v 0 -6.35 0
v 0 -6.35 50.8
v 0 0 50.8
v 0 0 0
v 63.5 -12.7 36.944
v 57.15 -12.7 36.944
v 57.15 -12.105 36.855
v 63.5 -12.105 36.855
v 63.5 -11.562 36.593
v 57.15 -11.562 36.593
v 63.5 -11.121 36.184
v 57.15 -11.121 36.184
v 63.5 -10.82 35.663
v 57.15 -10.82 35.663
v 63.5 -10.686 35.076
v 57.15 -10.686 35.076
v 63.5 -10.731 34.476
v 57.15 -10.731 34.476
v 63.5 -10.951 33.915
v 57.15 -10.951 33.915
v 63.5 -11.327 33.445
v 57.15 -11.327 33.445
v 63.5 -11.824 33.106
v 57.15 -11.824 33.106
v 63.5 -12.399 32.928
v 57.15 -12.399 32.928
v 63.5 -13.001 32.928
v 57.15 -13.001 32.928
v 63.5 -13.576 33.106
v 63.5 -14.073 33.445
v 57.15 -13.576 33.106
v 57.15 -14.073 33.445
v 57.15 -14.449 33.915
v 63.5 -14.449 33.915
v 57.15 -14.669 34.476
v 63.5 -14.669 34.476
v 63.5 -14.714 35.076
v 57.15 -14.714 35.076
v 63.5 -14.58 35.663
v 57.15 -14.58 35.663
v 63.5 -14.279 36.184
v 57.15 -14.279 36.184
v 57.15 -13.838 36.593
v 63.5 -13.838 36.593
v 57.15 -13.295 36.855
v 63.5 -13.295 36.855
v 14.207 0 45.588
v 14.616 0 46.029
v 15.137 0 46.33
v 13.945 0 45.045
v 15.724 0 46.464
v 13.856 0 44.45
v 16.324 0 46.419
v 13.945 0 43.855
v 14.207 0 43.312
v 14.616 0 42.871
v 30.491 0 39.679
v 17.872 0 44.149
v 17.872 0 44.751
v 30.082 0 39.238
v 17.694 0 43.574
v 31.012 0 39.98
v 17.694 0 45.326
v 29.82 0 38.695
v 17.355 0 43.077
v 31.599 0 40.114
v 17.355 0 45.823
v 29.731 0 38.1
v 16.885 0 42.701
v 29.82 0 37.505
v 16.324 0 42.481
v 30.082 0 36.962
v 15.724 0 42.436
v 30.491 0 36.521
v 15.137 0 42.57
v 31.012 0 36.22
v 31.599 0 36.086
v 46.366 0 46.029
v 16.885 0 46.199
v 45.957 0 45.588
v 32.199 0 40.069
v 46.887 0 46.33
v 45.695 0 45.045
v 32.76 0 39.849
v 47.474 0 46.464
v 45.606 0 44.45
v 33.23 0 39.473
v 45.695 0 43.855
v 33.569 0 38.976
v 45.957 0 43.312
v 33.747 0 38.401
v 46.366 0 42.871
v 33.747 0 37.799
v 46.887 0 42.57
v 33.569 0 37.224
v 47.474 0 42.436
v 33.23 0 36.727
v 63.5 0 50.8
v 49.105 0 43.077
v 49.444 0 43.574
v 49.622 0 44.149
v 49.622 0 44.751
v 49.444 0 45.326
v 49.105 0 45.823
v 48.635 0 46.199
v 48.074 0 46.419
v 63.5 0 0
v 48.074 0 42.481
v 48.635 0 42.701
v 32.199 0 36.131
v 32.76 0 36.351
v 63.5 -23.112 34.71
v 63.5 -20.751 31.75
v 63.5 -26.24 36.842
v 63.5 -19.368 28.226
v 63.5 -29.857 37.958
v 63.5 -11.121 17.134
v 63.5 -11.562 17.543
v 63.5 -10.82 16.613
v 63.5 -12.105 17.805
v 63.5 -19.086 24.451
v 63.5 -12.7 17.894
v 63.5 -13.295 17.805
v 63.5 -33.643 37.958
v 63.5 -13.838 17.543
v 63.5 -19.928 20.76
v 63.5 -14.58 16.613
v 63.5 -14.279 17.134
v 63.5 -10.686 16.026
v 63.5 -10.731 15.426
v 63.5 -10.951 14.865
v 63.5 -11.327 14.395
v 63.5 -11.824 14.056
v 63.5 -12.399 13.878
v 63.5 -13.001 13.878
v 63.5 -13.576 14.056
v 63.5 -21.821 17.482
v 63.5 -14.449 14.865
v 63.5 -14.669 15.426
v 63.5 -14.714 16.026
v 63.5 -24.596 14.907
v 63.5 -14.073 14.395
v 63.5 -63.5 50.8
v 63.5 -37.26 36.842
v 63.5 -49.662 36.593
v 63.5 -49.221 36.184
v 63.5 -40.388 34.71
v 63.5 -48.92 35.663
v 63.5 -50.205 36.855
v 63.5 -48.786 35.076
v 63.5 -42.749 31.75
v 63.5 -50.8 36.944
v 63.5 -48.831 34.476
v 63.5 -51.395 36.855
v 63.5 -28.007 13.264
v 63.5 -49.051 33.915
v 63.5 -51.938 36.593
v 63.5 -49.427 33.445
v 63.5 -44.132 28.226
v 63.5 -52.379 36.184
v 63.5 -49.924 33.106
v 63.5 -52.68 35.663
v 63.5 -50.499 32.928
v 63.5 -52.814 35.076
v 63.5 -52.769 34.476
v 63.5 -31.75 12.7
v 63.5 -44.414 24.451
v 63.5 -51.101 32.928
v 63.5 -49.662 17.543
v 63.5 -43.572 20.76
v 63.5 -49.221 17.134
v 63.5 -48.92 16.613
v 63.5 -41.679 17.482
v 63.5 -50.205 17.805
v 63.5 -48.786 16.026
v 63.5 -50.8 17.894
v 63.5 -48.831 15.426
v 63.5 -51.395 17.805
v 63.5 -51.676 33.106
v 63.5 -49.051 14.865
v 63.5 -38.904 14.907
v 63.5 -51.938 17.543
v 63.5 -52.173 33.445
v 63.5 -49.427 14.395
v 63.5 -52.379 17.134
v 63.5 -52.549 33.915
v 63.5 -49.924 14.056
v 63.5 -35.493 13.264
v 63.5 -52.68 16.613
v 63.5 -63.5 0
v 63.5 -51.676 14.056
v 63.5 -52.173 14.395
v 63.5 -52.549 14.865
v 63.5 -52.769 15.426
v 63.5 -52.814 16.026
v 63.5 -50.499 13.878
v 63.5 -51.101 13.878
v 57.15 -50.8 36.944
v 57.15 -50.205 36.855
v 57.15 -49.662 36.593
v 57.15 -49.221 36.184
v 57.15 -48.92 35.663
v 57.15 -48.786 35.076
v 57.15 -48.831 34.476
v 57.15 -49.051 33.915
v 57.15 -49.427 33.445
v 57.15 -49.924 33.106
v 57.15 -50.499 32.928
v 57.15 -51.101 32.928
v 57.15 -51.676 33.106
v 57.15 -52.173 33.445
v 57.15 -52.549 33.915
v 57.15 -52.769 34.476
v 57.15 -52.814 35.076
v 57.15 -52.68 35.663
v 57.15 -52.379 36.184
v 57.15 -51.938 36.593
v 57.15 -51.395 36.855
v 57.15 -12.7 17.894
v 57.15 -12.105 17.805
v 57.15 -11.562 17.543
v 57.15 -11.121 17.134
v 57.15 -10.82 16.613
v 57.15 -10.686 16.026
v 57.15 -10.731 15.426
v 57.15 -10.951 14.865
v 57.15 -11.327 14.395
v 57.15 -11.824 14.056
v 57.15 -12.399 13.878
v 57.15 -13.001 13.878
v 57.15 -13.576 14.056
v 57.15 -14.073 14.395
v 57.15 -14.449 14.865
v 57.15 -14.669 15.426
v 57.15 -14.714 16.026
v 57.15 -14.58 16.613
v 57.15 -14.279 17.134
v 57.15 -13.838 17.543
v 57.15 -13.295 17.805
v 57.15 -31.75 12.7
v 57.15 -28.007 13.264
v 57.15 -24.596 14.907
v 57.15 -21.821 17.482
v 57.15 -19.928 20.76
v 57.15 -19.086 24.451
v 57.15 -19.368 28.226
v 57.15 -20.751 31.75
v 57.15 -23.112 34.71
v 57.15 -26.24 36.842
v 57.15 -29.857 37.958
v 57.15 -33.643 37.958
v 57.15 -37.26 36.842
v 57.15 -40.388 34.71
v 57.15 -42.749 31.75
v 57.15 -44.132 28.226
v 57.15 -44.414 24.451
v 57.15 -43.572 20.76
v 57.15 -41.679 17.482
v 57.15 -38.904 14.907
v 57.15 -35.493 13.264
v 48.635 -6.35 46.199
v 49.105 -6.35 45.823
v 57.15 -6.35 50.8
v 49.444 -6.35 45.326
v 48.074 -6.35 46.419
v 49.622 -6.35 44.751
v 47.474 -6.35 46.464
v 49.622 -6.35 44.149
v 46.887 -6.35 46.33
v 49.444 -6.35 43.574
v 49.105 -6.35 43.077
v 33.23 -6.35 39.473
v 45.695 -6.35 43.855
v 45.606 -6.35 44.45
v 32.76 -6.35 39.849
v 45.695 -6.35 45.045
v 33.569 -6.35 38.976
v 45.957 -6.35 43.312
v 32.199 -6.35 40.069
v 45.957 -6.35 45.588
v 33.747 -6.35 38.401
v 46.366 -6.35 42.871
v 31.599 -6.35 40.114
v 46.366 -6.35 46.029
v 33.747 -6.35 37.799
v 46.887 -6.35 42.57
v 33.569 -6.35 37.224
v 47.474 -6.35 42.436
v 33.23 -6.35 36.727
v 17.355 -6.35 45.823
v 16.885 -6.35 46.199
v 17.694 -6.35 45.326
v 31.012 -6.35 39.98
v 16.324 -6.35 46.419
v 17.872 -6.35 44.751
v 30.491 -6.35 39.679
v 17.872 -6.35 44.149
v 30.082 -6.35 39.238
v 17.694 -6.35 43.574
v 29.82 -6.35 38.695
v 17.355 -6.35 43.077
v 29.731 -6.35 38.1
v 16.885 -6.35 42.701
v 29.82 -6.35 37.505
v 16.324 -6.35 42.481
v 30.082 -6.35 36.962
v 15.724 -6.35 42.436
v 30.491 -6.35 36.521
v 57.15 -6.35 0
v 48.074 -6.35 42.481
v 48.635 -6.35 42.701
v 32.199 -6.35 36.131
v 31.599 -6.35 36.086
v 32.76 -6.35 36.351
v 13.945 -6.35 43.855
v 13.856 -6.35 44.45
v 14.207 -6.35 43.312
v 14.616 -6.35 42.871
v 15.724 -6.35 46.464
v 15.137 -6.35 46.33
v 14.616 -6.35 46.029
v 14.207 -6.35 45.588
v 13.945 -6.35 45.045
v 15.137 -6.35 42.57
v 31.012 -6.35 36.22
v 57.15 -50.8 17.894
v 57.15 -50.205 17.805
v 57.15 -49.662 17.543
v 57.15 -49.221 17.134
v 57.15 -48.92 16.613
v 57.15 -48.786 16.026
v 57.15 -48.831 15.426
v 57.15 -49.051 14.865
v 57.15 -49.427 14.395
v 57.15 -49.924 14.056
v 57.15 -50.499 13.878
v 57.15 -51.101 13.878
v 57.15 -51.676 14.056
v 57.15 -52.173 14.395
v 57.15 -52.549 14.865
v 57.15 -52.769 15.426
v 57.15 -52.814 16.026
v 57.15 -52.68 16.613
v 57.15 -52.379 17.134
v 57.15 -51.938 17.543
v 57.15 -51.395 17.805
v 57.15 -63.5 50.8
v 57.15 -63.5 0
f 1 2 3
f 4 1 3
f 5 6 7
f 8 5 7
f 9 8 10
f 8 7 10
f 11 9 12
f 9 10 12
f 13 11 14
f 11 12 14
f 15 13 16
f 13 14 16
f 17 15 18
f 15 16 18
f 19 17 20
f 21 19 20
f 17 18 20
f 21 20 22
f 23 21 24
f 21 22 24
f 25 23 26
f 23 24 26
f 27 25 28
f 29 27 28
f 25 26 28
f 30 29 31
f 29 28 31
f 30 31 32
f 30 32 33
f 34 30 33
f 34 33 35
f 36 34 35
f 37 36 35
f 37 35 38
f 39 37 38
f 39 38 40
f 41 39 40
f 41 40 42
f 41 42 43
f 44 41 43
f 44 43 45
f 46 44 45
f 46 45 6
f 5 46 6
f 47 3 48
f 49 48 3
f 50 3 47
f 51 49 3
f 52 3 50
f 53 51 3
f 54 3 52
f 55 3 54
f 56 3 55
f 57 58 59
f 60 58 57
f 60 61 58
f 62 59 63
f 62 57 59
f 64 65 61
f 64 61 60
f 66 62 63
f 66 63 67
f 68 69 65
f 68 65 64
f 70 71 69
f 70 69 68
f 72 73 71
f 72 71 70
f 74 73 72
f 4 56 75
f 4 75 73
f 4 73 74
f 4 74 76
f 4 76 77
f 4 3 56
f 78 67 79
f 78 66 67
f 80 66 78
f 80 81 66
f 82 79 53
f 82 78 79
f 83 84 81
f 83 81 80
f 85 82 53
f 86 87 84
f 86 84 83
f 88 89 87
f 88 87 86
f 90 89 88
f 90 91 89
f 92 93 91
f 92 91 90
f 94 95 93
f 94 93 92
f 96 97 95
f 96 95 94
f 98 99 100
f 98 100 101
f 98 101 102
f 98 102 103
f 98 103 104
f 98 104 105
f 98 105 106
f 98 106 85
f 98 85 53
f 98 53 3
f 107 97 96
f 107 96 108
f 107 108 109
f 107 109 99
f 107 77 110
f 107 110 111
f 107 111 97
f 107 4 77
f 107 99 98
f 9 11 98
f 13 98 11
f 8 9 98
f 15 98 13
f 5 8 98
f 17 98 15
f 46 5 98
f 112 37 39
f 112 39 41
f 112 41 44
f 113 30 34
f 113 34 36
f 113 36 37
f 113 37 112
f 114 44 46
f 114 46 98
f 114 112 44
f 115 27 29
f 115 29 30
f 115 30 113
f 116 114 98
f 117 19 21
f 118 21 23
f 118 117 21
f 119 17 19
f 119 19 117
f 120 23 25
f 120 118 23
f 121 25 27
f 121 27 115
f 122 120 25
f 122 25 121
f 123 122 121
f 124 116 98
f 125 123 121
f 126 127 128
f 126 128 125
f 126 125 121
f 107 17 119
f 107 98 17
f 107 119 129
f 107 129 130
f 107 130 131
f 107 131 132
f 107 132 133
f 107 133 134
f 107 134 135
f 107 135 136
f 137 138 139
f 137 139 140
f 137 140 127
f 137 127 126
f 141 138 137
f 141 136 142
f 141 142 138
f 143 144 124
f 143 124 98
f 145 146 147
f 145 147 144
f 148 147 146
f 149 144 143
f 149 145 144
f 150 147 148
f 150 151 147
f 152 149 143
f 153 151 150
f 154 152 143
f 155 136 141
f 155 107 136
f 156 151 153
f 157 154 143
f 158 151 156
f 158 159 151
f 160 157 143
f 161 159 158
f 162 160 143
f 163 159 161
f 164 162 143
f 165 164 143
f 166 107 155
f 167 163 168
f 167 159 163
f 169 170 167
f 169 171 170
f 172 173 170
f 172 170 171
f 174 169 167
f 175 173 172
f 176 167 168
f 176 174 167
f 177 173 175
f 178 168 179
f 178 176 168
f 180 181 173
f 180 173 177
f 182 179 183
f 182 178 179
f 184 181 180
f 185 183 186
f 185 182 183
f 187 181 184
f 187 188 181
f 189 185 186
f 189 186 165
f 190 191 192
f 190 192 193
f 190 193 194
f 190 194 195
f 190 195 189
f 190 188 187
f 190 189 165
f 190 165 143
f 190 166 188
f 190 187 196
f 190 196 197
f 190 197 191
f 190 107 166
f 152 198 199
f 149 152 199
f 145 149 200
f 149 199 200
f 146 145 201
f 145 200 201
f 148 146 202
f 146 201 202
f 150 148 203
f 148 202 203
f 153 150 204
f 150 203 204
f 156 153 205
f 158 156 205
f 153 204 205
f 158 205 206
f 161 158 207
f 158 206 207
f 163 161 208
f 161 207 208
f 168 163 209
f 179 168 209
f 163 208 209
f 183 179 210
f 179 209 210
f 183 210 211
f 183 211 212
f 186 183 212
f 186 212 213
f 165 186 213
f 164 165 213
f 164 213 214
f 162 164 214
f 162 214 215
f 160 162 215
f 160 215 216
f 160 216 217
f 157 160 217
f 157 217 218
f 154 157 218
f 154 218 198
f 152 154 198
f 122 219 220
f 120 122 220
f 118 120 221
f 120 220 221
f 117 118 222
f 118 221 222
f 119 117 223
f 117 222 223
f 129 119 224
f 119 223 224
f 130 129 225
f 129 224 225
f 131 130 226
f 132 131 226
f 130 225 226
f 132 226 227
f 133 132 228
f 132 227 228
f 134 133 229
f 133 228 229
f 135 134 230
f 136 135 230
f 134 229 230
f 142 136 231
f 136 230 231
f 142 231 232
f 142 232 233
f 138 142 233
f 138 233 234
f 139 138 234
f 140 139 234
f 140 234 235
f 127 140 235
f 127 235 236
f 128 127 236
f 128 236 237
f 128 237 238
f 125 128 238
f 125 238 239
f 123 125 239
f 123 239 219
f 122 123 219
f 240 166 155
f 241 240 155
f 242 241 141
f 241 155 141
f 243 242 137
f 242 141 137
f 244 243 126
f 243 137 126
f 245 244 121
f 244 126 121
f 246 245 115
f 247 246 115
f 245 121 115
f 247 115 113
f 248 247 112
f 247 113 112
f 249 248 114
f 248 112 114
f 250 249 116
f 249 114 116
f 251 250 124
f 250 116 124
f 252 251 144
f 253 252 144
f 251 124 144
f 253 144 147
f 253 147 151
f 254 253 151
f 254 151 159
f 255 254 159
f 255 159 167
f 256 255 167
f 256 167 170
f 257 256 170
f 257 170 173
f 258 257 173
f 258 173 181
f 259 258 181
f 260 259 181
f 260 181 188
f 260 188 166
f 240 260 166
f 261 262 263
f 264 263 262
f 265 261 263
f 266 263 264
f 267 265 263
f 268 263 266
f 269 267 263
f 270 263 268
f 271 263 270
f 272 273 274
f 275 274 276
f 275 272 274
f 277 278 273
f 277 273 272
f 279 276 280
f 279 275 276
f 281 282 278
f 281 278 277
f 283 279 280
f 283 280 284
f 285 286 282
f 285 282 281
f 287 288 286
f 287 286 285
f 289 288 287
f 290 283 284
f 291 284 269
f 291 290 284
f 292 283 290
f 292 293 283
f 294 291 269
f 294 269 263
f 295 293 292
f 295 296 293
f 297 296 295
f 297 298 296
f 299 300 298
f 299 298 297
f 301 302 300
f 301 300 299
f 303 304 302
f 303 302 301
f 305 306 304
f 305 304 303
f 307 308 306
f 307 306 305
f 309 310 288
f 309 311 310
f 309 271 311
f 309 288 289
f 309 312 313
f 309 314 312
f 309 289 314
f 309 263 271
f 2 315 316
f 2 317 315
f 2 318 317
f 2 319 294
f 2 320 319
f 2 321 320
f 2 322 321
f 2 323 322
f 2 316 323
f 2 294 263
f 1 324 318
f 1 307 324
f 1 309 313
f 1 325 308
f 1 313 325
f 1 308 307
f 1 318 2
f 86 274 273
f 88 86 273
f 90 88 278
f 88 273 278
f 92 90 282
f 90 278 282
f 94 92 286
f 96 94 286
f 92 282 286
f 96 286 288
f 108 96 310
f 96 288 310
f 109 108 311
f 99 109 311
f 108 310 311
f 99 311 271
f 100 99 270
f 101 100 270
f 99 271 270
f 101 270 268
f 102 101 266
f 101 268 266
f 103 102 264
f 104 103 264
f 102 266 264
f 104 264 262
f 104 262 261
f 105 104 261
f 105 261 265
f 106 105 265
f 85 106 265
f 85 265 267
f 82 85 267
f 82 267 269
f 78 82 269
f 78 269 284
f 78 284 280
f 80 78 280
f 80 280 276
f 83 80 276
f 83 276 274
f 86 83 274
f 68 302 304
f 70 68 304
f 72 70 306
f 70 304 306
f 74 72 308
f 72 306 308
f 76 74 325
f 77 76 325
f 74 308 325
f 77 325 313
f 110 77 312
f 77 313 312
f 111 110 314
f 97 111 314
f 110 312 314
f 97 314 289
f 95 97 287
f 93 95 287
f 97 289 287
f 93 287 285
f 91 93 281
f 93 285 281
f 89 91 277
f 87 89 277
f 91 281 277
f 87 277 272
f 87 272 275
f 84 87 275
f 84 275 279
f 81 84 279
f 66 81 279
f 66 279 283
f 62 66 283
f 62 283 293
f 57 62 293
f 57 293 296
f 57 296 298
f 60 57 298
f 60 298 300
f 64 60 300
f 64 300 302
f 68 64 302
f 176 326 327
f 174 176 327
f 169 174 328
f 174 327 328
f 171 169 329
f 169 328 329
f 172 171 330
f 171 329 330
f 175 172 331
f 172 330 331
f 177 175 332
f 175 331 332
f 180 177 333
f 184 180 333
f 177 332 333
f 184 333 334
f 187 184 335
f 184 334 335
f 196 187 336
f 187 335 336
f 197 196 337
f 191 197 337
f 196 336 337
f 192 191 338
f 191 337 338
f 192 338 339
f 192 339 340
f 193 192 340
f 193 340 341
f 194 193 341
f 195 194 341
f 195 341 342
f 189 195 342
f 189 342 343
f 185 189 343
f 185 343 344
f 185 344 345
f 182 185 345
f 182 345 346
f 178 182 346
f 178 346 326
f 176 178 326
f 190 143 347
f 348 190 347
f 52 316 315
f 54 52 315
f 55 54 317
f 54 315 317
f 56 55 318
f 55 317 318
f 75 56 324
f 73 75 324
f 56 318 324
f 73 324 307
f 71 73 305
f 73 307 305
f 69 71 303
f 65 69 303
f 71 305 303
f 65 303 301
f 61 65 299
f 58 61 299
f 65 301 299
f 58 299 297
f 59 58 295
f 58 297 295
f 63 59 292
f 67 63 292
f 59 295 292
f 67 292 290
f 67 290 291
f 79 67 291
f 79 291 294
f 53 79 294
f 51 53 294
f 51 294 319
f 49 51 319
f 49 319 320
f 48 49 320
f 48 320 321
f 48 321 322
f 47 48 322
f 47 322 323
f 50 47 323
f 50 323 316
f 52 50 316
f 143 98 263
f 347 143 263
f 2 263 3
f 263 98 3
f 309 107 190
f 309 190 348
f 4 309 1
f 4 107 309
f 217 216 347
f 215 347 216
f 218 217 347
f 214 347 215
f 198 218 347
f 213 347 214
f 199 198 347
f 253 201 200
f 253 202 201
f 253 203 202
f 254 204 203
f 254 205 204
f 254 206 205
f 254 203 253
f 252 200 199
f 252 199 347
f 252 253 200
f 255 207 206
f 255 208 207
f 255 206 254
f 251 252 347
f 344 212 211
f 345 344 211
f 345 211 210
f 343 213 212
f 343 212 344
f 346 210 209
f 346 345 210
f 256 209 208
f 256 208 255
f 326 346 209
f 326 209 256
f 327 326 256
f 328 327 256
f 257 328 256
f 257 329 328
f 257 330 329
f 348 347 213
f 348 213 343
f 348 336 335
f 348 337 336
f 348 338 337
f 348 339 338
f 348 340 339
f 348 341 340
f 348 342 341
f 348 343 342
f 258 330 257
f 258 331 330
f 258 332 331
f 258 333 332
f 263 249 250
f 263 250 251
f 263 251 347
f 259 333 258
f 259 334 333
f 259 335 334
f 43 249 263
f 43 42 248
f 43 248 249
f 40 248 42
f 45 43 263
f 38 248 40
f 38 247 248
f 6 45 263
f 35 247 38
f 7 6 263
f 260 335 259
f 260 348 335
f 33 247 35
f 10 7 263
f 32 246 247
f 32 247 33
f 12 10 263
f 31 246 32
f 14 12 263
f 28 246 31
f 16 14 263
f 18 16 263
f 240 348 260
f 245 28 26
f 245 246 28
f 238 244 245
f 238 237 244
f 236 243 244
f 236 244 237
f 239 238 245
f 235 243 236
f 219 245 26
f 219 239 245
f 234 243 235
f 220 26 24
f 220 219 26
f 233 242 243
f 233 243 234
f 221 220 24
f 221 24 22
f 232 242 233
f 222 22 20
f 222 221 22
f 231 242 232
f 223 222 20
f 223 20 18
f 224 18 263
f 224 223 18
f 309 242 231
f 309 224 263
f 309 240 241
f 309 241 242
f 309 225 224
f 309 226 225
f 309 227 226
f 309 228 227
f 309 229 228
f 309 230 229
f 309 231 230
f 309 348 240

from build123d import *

# Parameters (mm, degrees)
BOSS_EXTRUDE1_DEPTH        = 50.8
CUT_EXTRUDE1_REACH         = 65.5
SKETCH2_R                  = 12.7
F_10_32_TAPPED_HOLE1_D     = 4.0386
F_10_32_TAPPED_HOLE1_DEPTH = 6.35
F_10_32_TAPPED_HOLE2_D     = 4.0386
F_10_32_TAPPED_HOLE2_DEPTH = 6.35


with BuildPart() as part:
    # Sketch1 → Boss-Extrude1 (new body)
    with BuildSketch(Plane.XY):
        Polygon((0, 0), (63.5, 0), (63.5, -63.5), (57.15, -63.5), (57.15, -6.35), (0, -6.35), align=None)
    extrude(amount=BOSS_EXTRUDE1_DEPTH)

    # Sketch2 → Cut-Extrude1 (cut, up to next)
    with BuildSketch(Plane(origin=(63.5, 0, 0), x_dir=(0, 0, -1), z_dir=(1, 0, 0)), mode=Mode.PRIVATE) as cut_extrude1_sk1:
        with Locations((-25.4, -31.75)):
            Circle(SKETCH2_R)
    cut_extrude1_tool1 = extrude(cut_extrude1_sk1.sketch, amount=-CUT_EXTRUDE1_REACH, mode=Mode.PRIVATE) & part.part
    add(cut_extrude1_tool1.solids().sort_by_distance((63.5, -31.75, 25.4))[0], mode=Mode.SUBTRACT)

    # #10-32 Tapped Hole1
    with Locations(Plane(origin=(63.5, 0, 0), x_dir=(0, 0, -1), z_dir=(1, 0, 0))):
        with Locations((-34.925, -50.8), (-15.875, -50.8), (-34.925, -12.7), (-15.875, -12.7)):
            Hole(F_10_32_TAPPED_HOLE1_D / 2, depth=F_10_32_TAPPED_HOLE1_DEPTH)

    # #10-32 Tapped Hole2
    with Locations(Plane(origin=(0, 0, 0), x_dir=(1, 0, 0), z_dir=(0, 1, 0))):
        with Locations((47.625, -44.45), (31.75, -38.1), (15.875, -44.45)):
            Hole(F_10_32_TAPPED_HOLE2_D / 2, depth=F_10_32_TAPPED_HOLE2_DEPTH)


solid = part.part
